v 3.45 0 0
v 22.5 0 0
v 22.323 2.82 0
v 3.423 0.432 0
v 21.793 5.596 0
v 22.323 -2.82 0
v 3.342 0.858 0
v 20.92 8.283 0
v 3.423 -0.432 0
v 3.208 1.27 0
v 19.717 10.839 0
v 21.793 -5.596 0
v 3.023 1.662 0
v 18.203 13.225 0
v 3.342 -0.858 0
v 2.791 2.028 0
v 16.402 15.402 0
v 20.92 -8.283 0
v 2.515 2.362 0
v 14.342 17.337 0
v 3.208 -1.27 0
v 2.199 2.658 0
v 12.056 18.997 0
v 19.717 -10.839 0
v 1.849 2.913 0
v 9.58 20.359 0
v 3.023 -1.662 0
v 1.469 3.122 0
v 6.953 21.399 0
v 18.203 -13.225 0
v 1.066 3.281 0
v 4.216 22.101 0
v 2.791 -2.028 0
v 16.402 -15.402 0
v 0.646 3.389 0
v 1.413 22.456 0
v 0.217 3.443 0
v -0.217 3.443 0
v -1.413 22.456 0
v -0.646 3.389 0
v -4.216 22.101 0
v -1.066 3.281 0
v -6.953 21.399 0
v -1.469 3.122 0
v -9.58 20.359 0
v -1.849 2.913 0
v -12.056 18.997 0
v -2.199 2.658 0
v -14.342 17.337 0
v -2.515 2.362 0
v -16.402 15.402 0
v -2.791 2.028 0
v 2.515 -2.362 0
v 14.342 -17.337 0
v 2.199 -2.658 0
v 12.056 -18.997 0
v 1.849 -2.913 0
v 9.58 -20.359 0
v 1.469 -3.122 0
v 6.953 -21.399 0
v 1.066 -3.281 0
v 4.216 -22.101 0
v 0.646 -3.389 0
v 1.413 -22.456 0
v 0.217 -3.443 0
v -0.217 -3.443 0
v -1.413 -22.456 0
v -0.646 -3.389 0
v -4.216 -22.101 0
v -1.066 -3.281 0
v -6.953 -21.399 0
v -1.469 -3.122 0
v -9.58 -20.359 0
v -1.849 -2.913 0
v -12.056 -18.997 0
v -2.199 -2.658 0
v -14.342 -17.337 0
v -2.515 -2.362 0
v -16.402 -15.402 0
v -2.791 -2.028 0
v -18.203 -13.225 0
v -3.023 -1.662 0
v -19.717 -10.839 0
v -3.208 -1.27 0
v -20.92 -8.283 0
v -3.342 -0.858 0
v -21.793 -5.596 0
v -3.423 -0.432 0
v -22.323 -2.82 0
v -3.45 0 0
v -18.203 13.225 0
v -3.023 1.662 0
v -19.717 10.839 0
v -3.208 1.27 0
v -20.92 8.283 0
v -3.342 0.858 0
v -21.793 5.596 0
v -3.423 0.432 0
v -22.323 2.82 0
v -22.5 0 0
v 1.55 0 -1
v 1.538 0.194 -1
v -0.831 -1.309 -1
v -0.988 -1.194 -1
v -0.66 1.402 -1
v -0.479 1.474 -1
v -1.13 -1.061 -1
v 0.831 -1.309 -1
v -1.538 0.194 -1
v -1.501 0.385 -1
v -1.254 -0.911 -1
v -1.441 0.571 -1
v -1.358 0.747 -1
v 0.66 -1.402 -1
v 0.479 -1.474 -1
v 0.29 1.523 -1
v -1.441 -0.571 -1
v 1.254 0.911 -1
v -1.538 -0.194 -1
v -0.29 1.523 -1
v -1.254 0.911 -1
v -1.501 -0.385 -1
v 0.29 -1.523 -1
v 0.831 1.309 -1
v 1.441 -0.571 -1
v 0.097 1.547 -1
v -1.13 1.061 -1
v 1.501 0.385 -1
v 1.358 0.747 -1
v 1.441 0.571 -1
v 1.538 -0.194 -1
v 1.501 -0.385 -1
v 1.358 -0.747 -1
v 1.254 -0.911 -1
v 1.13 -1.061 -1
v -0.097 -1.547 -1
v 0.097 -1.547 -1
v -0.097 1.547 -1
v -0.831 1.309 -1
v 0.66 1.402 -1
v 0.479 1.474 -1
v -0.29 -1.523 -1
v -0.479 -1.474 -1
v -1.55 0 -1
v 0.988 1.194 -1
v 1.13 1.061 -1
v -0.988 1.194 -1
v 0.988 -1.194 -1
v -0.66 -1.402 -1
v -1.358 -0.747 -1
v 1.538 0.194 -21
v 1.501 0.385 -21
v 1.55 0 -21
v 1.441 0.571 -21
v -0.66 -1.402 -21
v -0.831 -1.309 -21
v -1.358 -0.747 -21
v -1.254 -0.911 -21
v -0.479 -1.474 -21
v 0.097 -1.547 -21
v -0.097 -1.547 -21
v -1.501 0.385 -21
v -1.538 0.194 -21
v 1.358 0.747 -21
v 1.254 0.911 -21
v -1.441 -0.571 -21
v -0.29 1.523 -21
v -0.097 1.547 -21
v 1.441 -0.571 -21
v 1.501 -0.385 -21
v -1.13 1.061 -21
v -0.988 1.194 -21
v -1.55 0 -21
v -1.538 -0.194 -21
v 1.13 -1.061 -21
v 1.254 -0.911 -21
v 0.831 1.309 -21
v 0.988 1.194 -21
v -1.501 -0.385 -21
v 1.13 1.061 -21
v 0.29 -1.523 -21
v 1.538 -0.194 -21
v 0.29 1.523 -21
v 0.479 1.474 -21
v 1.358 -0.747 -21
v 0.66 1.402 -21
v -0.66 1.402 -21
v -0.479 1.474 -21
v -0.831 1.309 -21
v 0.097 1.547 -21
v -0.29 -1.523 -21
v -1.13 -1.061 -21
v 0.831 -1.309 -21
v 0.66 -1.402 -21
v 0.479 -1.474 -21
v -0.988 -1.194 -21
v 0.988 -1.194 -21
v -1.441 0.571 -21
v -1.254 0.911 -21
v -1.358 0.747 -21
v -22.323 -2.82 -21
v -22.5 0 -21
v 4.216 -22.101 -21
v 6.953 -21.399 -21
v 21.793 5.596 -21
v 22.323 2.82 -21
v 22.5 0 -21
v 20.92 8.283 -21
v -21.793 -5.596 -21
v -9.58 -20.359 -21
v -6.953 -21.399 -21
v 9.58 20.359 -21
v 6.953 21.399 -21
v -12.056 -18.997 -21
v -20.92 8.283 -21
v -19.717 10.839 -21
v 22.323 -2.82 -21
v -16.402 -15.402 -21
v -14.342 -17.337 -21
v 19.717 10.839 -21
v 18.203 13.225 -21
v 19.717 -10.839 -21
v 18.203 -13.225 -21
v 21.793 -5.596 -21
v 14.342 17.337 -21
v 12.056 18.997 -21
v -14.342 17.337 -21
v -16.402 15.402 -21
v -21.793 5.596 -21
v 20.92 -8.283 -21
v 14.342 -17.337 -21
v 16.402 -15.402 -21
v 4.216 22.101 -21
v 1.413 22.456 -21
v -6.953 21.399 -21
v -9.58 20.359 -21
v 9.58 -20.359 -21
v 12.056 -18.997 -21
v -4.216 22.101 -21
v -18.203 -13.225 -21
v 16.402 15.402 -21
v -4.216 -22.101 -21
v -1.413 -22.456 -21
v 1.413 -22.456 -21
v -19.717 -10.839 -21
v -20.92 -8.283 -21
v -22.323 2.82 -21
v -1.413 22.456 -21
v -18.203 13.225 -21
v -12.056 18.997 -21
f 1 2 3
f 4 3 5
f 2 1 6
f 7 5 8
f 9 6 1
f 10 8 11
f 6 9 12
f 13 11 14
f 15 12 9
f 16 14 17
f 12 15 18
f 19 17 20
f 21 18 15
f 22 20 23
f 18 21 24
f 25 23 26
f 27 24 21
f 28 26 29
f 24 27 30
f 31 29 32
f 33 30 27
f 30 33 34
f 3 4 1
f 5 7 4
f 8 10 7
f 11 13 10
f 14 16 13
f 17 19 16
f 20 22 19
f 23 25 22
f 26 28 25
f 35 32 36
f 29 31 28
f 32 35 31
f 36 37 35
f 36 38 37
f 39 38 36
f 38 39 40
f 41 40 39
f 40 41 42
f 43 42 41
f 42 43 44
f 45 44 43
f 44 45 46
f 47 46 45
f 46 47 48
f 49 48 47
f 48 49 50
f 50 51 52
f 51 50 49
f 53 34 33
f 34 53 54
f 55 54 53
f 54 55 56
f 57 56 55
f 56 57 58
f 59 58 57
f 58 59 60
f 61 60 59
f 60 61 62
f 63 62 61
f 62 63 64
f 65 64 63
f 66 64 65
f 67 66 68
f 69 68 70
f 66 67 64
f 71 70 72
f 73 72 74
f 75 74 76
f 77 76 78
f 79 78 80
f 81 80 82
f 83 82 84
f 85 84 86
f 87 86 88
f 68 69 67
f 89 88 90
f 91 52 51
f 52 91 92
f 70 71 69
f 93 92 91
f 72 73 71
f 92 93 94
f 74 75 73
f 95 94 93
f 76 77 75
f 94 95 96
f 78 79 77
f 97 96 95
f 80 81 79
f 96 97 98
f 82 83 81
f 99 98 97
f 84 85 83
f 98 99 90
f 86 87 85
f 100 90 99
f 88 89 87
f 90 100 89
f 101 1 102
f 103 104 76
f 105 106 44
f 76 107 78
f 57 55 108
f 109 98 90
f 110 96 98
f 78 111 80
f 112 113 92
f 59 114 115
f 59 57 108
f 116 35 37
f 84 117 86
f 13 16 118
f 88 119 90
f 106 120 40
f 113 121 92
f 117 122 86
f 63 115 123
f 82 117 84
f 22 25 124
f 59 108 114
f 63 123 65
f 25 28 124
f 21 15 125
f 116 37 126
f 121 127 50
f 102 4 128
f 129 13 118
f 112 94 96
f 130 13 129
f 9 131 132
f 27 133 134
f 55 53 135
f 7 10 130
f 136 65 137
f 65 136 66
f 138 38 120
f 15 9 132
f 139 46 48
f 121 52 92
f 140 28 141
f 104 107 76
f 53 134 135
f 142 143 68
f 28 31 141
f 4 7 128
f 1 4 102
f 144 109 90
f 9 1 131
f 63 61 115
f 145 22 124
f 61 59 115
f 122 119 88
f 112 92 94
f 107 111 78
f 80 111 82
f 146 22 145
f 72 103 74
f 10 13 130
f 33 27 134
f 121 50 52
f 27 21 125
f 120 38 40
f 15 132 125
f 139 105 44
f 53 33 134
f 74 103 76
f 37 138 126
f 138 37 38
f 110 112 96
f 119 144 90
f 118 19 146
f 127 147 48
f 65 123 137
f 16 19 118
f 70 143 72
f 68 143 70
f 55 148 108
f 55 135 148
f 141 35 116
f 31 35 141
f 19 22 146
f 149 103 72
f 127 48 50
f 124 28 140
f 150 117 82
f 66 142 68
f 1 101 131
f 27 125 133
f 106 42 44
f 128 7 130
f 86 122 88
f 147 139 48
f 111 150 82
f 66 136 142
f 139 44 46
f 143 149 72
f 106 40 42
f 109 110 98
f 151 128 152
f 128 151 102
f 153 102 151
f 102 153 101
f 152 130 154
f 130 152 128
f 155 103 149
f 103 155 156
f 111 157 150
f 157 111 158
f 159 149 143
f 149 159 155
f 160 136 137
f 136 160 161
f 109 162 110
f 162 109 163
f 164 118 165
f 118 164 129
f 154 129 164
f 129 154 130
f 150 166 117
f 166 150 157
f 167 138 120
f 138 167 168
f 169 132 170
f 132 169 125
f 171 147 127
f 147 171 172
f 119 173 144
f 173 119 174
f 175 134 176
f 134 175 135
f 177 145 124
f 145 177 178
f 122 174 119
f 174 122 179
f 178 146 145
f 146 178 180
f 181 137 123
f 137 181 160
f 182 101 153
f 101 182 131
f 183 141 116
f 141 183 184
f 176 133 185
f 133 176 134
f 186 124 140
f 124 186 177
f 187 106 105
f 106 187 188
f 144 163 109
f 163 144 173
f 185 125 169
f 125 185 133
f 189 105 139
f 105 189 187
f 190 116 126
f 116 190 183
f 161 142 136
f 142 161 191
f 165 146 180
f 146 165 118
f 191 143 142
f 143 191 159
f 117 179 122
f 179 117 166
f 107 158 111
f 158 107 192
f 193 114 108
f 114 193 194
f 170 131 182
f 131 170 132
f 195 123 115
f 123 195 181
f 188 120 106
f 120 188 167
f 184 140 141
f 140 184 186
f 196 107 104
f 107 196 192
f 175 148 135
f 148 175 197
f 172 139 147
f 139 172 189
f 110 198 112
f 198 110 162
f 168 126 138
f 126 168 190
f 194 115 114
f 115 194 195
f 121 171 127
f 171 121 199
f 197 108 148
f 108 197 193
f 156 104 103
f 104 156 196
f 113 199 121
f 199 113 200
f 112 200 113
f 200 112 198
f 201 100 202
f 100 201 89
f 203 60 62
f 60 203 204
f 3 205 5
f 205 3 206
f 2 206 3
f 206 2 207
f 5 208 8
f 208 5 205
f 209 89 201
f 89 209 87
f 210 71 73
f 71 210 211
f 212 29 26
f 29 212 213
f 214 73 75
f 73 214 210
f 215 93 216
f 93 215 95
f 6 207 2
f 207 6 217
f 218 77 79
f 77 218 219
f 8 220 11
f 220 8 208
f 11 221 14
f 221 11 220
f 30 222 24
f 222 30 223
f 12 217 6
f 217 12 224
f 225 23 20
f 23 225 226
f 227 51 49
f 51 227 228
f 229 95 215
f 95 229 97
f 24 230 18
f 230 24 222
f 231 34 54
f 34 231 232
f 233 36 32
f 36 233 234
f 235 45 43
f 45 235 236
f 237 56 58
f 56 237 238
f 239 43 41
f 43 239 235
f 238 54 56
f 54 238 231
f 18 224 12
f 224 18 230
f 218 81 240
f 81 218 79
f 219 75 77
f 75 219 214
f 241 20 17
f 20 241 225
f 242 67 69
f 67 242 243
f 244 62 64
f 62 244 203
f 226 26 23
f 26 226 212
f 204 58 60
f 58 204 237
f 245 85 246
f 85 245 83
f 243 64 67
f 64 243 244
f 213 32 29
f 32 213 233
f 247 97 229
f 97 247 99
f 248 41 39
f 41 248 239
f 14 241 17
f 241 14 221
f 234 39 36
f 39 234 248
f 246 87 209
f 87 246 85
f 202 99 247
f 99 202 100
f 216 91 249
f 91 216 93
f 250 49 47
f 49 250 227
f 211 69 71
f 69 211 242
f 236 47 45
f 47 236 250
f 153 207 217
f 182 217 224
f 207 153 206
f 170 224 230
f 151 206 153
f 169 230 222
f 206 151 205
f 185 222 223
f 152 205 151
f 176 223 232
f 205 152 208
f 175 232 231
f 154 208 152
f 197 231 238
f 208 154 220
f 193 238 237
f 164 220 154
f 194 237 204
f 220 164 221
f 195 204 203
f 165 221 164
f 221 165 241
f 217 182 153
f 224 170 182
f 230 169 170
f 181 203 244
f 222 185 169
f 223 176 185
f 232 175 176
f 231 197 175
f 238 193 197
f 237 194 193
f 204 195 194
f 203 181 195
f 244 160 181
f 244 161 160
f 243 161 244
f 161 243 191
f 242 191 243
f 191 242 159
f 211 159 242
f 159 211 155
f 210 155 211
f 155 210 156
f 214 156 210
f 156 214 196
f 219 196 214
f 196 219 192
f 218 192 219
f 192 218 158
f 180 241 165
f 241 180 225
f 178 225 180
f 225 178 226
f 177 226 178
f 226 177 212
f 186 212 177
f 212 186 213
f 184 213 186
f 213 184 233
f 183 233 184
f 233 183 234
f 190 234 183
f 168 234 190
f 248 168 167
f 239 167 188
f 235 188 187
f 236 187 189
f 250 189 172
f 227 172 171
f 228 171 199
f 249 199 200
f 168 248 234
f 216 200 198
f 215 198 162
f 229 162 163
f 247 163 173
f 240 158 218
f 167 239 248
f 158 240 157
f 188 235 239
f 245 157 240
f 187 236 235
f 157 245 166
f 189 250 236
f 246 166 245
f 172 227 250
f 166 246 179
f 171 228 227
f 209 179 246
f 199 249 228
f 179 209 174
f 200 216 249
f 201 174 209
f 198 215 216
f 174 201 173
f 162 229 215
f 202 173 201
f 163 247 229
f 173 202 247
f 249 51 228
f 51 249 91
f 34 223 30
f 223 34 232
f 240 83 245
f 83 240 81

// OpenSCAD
$fn = 50;

difference() {
	union() {
		translate(v = [0, 0, -21.0]) {
			cylinder(h = 21, r = 22.5);
		}
	}
	union() {
		translate(v = [0, 0, 0]) {
			rotate(a = [0, 0, 0]) {
				difference() {
					union() {
						translate(v = [0, 0, -24.0]) {
							cylinder(h = 24, r = 1.25);
						}
						translate(v = [0, 0, -1.0]) {
							cylinder(h = 1.0, r1 = 1.55, r2 = 3.45);
						}
						translate(v = [0, 0, -24.0]) {
							cylinder(h = 24, r = 1.55);
						}
						translate(v = [0, 0, -24.0]) {
							cylinder(h = 24, r = 1.25);
						}
					}
					union();
				}
			}
		}
	}
}
